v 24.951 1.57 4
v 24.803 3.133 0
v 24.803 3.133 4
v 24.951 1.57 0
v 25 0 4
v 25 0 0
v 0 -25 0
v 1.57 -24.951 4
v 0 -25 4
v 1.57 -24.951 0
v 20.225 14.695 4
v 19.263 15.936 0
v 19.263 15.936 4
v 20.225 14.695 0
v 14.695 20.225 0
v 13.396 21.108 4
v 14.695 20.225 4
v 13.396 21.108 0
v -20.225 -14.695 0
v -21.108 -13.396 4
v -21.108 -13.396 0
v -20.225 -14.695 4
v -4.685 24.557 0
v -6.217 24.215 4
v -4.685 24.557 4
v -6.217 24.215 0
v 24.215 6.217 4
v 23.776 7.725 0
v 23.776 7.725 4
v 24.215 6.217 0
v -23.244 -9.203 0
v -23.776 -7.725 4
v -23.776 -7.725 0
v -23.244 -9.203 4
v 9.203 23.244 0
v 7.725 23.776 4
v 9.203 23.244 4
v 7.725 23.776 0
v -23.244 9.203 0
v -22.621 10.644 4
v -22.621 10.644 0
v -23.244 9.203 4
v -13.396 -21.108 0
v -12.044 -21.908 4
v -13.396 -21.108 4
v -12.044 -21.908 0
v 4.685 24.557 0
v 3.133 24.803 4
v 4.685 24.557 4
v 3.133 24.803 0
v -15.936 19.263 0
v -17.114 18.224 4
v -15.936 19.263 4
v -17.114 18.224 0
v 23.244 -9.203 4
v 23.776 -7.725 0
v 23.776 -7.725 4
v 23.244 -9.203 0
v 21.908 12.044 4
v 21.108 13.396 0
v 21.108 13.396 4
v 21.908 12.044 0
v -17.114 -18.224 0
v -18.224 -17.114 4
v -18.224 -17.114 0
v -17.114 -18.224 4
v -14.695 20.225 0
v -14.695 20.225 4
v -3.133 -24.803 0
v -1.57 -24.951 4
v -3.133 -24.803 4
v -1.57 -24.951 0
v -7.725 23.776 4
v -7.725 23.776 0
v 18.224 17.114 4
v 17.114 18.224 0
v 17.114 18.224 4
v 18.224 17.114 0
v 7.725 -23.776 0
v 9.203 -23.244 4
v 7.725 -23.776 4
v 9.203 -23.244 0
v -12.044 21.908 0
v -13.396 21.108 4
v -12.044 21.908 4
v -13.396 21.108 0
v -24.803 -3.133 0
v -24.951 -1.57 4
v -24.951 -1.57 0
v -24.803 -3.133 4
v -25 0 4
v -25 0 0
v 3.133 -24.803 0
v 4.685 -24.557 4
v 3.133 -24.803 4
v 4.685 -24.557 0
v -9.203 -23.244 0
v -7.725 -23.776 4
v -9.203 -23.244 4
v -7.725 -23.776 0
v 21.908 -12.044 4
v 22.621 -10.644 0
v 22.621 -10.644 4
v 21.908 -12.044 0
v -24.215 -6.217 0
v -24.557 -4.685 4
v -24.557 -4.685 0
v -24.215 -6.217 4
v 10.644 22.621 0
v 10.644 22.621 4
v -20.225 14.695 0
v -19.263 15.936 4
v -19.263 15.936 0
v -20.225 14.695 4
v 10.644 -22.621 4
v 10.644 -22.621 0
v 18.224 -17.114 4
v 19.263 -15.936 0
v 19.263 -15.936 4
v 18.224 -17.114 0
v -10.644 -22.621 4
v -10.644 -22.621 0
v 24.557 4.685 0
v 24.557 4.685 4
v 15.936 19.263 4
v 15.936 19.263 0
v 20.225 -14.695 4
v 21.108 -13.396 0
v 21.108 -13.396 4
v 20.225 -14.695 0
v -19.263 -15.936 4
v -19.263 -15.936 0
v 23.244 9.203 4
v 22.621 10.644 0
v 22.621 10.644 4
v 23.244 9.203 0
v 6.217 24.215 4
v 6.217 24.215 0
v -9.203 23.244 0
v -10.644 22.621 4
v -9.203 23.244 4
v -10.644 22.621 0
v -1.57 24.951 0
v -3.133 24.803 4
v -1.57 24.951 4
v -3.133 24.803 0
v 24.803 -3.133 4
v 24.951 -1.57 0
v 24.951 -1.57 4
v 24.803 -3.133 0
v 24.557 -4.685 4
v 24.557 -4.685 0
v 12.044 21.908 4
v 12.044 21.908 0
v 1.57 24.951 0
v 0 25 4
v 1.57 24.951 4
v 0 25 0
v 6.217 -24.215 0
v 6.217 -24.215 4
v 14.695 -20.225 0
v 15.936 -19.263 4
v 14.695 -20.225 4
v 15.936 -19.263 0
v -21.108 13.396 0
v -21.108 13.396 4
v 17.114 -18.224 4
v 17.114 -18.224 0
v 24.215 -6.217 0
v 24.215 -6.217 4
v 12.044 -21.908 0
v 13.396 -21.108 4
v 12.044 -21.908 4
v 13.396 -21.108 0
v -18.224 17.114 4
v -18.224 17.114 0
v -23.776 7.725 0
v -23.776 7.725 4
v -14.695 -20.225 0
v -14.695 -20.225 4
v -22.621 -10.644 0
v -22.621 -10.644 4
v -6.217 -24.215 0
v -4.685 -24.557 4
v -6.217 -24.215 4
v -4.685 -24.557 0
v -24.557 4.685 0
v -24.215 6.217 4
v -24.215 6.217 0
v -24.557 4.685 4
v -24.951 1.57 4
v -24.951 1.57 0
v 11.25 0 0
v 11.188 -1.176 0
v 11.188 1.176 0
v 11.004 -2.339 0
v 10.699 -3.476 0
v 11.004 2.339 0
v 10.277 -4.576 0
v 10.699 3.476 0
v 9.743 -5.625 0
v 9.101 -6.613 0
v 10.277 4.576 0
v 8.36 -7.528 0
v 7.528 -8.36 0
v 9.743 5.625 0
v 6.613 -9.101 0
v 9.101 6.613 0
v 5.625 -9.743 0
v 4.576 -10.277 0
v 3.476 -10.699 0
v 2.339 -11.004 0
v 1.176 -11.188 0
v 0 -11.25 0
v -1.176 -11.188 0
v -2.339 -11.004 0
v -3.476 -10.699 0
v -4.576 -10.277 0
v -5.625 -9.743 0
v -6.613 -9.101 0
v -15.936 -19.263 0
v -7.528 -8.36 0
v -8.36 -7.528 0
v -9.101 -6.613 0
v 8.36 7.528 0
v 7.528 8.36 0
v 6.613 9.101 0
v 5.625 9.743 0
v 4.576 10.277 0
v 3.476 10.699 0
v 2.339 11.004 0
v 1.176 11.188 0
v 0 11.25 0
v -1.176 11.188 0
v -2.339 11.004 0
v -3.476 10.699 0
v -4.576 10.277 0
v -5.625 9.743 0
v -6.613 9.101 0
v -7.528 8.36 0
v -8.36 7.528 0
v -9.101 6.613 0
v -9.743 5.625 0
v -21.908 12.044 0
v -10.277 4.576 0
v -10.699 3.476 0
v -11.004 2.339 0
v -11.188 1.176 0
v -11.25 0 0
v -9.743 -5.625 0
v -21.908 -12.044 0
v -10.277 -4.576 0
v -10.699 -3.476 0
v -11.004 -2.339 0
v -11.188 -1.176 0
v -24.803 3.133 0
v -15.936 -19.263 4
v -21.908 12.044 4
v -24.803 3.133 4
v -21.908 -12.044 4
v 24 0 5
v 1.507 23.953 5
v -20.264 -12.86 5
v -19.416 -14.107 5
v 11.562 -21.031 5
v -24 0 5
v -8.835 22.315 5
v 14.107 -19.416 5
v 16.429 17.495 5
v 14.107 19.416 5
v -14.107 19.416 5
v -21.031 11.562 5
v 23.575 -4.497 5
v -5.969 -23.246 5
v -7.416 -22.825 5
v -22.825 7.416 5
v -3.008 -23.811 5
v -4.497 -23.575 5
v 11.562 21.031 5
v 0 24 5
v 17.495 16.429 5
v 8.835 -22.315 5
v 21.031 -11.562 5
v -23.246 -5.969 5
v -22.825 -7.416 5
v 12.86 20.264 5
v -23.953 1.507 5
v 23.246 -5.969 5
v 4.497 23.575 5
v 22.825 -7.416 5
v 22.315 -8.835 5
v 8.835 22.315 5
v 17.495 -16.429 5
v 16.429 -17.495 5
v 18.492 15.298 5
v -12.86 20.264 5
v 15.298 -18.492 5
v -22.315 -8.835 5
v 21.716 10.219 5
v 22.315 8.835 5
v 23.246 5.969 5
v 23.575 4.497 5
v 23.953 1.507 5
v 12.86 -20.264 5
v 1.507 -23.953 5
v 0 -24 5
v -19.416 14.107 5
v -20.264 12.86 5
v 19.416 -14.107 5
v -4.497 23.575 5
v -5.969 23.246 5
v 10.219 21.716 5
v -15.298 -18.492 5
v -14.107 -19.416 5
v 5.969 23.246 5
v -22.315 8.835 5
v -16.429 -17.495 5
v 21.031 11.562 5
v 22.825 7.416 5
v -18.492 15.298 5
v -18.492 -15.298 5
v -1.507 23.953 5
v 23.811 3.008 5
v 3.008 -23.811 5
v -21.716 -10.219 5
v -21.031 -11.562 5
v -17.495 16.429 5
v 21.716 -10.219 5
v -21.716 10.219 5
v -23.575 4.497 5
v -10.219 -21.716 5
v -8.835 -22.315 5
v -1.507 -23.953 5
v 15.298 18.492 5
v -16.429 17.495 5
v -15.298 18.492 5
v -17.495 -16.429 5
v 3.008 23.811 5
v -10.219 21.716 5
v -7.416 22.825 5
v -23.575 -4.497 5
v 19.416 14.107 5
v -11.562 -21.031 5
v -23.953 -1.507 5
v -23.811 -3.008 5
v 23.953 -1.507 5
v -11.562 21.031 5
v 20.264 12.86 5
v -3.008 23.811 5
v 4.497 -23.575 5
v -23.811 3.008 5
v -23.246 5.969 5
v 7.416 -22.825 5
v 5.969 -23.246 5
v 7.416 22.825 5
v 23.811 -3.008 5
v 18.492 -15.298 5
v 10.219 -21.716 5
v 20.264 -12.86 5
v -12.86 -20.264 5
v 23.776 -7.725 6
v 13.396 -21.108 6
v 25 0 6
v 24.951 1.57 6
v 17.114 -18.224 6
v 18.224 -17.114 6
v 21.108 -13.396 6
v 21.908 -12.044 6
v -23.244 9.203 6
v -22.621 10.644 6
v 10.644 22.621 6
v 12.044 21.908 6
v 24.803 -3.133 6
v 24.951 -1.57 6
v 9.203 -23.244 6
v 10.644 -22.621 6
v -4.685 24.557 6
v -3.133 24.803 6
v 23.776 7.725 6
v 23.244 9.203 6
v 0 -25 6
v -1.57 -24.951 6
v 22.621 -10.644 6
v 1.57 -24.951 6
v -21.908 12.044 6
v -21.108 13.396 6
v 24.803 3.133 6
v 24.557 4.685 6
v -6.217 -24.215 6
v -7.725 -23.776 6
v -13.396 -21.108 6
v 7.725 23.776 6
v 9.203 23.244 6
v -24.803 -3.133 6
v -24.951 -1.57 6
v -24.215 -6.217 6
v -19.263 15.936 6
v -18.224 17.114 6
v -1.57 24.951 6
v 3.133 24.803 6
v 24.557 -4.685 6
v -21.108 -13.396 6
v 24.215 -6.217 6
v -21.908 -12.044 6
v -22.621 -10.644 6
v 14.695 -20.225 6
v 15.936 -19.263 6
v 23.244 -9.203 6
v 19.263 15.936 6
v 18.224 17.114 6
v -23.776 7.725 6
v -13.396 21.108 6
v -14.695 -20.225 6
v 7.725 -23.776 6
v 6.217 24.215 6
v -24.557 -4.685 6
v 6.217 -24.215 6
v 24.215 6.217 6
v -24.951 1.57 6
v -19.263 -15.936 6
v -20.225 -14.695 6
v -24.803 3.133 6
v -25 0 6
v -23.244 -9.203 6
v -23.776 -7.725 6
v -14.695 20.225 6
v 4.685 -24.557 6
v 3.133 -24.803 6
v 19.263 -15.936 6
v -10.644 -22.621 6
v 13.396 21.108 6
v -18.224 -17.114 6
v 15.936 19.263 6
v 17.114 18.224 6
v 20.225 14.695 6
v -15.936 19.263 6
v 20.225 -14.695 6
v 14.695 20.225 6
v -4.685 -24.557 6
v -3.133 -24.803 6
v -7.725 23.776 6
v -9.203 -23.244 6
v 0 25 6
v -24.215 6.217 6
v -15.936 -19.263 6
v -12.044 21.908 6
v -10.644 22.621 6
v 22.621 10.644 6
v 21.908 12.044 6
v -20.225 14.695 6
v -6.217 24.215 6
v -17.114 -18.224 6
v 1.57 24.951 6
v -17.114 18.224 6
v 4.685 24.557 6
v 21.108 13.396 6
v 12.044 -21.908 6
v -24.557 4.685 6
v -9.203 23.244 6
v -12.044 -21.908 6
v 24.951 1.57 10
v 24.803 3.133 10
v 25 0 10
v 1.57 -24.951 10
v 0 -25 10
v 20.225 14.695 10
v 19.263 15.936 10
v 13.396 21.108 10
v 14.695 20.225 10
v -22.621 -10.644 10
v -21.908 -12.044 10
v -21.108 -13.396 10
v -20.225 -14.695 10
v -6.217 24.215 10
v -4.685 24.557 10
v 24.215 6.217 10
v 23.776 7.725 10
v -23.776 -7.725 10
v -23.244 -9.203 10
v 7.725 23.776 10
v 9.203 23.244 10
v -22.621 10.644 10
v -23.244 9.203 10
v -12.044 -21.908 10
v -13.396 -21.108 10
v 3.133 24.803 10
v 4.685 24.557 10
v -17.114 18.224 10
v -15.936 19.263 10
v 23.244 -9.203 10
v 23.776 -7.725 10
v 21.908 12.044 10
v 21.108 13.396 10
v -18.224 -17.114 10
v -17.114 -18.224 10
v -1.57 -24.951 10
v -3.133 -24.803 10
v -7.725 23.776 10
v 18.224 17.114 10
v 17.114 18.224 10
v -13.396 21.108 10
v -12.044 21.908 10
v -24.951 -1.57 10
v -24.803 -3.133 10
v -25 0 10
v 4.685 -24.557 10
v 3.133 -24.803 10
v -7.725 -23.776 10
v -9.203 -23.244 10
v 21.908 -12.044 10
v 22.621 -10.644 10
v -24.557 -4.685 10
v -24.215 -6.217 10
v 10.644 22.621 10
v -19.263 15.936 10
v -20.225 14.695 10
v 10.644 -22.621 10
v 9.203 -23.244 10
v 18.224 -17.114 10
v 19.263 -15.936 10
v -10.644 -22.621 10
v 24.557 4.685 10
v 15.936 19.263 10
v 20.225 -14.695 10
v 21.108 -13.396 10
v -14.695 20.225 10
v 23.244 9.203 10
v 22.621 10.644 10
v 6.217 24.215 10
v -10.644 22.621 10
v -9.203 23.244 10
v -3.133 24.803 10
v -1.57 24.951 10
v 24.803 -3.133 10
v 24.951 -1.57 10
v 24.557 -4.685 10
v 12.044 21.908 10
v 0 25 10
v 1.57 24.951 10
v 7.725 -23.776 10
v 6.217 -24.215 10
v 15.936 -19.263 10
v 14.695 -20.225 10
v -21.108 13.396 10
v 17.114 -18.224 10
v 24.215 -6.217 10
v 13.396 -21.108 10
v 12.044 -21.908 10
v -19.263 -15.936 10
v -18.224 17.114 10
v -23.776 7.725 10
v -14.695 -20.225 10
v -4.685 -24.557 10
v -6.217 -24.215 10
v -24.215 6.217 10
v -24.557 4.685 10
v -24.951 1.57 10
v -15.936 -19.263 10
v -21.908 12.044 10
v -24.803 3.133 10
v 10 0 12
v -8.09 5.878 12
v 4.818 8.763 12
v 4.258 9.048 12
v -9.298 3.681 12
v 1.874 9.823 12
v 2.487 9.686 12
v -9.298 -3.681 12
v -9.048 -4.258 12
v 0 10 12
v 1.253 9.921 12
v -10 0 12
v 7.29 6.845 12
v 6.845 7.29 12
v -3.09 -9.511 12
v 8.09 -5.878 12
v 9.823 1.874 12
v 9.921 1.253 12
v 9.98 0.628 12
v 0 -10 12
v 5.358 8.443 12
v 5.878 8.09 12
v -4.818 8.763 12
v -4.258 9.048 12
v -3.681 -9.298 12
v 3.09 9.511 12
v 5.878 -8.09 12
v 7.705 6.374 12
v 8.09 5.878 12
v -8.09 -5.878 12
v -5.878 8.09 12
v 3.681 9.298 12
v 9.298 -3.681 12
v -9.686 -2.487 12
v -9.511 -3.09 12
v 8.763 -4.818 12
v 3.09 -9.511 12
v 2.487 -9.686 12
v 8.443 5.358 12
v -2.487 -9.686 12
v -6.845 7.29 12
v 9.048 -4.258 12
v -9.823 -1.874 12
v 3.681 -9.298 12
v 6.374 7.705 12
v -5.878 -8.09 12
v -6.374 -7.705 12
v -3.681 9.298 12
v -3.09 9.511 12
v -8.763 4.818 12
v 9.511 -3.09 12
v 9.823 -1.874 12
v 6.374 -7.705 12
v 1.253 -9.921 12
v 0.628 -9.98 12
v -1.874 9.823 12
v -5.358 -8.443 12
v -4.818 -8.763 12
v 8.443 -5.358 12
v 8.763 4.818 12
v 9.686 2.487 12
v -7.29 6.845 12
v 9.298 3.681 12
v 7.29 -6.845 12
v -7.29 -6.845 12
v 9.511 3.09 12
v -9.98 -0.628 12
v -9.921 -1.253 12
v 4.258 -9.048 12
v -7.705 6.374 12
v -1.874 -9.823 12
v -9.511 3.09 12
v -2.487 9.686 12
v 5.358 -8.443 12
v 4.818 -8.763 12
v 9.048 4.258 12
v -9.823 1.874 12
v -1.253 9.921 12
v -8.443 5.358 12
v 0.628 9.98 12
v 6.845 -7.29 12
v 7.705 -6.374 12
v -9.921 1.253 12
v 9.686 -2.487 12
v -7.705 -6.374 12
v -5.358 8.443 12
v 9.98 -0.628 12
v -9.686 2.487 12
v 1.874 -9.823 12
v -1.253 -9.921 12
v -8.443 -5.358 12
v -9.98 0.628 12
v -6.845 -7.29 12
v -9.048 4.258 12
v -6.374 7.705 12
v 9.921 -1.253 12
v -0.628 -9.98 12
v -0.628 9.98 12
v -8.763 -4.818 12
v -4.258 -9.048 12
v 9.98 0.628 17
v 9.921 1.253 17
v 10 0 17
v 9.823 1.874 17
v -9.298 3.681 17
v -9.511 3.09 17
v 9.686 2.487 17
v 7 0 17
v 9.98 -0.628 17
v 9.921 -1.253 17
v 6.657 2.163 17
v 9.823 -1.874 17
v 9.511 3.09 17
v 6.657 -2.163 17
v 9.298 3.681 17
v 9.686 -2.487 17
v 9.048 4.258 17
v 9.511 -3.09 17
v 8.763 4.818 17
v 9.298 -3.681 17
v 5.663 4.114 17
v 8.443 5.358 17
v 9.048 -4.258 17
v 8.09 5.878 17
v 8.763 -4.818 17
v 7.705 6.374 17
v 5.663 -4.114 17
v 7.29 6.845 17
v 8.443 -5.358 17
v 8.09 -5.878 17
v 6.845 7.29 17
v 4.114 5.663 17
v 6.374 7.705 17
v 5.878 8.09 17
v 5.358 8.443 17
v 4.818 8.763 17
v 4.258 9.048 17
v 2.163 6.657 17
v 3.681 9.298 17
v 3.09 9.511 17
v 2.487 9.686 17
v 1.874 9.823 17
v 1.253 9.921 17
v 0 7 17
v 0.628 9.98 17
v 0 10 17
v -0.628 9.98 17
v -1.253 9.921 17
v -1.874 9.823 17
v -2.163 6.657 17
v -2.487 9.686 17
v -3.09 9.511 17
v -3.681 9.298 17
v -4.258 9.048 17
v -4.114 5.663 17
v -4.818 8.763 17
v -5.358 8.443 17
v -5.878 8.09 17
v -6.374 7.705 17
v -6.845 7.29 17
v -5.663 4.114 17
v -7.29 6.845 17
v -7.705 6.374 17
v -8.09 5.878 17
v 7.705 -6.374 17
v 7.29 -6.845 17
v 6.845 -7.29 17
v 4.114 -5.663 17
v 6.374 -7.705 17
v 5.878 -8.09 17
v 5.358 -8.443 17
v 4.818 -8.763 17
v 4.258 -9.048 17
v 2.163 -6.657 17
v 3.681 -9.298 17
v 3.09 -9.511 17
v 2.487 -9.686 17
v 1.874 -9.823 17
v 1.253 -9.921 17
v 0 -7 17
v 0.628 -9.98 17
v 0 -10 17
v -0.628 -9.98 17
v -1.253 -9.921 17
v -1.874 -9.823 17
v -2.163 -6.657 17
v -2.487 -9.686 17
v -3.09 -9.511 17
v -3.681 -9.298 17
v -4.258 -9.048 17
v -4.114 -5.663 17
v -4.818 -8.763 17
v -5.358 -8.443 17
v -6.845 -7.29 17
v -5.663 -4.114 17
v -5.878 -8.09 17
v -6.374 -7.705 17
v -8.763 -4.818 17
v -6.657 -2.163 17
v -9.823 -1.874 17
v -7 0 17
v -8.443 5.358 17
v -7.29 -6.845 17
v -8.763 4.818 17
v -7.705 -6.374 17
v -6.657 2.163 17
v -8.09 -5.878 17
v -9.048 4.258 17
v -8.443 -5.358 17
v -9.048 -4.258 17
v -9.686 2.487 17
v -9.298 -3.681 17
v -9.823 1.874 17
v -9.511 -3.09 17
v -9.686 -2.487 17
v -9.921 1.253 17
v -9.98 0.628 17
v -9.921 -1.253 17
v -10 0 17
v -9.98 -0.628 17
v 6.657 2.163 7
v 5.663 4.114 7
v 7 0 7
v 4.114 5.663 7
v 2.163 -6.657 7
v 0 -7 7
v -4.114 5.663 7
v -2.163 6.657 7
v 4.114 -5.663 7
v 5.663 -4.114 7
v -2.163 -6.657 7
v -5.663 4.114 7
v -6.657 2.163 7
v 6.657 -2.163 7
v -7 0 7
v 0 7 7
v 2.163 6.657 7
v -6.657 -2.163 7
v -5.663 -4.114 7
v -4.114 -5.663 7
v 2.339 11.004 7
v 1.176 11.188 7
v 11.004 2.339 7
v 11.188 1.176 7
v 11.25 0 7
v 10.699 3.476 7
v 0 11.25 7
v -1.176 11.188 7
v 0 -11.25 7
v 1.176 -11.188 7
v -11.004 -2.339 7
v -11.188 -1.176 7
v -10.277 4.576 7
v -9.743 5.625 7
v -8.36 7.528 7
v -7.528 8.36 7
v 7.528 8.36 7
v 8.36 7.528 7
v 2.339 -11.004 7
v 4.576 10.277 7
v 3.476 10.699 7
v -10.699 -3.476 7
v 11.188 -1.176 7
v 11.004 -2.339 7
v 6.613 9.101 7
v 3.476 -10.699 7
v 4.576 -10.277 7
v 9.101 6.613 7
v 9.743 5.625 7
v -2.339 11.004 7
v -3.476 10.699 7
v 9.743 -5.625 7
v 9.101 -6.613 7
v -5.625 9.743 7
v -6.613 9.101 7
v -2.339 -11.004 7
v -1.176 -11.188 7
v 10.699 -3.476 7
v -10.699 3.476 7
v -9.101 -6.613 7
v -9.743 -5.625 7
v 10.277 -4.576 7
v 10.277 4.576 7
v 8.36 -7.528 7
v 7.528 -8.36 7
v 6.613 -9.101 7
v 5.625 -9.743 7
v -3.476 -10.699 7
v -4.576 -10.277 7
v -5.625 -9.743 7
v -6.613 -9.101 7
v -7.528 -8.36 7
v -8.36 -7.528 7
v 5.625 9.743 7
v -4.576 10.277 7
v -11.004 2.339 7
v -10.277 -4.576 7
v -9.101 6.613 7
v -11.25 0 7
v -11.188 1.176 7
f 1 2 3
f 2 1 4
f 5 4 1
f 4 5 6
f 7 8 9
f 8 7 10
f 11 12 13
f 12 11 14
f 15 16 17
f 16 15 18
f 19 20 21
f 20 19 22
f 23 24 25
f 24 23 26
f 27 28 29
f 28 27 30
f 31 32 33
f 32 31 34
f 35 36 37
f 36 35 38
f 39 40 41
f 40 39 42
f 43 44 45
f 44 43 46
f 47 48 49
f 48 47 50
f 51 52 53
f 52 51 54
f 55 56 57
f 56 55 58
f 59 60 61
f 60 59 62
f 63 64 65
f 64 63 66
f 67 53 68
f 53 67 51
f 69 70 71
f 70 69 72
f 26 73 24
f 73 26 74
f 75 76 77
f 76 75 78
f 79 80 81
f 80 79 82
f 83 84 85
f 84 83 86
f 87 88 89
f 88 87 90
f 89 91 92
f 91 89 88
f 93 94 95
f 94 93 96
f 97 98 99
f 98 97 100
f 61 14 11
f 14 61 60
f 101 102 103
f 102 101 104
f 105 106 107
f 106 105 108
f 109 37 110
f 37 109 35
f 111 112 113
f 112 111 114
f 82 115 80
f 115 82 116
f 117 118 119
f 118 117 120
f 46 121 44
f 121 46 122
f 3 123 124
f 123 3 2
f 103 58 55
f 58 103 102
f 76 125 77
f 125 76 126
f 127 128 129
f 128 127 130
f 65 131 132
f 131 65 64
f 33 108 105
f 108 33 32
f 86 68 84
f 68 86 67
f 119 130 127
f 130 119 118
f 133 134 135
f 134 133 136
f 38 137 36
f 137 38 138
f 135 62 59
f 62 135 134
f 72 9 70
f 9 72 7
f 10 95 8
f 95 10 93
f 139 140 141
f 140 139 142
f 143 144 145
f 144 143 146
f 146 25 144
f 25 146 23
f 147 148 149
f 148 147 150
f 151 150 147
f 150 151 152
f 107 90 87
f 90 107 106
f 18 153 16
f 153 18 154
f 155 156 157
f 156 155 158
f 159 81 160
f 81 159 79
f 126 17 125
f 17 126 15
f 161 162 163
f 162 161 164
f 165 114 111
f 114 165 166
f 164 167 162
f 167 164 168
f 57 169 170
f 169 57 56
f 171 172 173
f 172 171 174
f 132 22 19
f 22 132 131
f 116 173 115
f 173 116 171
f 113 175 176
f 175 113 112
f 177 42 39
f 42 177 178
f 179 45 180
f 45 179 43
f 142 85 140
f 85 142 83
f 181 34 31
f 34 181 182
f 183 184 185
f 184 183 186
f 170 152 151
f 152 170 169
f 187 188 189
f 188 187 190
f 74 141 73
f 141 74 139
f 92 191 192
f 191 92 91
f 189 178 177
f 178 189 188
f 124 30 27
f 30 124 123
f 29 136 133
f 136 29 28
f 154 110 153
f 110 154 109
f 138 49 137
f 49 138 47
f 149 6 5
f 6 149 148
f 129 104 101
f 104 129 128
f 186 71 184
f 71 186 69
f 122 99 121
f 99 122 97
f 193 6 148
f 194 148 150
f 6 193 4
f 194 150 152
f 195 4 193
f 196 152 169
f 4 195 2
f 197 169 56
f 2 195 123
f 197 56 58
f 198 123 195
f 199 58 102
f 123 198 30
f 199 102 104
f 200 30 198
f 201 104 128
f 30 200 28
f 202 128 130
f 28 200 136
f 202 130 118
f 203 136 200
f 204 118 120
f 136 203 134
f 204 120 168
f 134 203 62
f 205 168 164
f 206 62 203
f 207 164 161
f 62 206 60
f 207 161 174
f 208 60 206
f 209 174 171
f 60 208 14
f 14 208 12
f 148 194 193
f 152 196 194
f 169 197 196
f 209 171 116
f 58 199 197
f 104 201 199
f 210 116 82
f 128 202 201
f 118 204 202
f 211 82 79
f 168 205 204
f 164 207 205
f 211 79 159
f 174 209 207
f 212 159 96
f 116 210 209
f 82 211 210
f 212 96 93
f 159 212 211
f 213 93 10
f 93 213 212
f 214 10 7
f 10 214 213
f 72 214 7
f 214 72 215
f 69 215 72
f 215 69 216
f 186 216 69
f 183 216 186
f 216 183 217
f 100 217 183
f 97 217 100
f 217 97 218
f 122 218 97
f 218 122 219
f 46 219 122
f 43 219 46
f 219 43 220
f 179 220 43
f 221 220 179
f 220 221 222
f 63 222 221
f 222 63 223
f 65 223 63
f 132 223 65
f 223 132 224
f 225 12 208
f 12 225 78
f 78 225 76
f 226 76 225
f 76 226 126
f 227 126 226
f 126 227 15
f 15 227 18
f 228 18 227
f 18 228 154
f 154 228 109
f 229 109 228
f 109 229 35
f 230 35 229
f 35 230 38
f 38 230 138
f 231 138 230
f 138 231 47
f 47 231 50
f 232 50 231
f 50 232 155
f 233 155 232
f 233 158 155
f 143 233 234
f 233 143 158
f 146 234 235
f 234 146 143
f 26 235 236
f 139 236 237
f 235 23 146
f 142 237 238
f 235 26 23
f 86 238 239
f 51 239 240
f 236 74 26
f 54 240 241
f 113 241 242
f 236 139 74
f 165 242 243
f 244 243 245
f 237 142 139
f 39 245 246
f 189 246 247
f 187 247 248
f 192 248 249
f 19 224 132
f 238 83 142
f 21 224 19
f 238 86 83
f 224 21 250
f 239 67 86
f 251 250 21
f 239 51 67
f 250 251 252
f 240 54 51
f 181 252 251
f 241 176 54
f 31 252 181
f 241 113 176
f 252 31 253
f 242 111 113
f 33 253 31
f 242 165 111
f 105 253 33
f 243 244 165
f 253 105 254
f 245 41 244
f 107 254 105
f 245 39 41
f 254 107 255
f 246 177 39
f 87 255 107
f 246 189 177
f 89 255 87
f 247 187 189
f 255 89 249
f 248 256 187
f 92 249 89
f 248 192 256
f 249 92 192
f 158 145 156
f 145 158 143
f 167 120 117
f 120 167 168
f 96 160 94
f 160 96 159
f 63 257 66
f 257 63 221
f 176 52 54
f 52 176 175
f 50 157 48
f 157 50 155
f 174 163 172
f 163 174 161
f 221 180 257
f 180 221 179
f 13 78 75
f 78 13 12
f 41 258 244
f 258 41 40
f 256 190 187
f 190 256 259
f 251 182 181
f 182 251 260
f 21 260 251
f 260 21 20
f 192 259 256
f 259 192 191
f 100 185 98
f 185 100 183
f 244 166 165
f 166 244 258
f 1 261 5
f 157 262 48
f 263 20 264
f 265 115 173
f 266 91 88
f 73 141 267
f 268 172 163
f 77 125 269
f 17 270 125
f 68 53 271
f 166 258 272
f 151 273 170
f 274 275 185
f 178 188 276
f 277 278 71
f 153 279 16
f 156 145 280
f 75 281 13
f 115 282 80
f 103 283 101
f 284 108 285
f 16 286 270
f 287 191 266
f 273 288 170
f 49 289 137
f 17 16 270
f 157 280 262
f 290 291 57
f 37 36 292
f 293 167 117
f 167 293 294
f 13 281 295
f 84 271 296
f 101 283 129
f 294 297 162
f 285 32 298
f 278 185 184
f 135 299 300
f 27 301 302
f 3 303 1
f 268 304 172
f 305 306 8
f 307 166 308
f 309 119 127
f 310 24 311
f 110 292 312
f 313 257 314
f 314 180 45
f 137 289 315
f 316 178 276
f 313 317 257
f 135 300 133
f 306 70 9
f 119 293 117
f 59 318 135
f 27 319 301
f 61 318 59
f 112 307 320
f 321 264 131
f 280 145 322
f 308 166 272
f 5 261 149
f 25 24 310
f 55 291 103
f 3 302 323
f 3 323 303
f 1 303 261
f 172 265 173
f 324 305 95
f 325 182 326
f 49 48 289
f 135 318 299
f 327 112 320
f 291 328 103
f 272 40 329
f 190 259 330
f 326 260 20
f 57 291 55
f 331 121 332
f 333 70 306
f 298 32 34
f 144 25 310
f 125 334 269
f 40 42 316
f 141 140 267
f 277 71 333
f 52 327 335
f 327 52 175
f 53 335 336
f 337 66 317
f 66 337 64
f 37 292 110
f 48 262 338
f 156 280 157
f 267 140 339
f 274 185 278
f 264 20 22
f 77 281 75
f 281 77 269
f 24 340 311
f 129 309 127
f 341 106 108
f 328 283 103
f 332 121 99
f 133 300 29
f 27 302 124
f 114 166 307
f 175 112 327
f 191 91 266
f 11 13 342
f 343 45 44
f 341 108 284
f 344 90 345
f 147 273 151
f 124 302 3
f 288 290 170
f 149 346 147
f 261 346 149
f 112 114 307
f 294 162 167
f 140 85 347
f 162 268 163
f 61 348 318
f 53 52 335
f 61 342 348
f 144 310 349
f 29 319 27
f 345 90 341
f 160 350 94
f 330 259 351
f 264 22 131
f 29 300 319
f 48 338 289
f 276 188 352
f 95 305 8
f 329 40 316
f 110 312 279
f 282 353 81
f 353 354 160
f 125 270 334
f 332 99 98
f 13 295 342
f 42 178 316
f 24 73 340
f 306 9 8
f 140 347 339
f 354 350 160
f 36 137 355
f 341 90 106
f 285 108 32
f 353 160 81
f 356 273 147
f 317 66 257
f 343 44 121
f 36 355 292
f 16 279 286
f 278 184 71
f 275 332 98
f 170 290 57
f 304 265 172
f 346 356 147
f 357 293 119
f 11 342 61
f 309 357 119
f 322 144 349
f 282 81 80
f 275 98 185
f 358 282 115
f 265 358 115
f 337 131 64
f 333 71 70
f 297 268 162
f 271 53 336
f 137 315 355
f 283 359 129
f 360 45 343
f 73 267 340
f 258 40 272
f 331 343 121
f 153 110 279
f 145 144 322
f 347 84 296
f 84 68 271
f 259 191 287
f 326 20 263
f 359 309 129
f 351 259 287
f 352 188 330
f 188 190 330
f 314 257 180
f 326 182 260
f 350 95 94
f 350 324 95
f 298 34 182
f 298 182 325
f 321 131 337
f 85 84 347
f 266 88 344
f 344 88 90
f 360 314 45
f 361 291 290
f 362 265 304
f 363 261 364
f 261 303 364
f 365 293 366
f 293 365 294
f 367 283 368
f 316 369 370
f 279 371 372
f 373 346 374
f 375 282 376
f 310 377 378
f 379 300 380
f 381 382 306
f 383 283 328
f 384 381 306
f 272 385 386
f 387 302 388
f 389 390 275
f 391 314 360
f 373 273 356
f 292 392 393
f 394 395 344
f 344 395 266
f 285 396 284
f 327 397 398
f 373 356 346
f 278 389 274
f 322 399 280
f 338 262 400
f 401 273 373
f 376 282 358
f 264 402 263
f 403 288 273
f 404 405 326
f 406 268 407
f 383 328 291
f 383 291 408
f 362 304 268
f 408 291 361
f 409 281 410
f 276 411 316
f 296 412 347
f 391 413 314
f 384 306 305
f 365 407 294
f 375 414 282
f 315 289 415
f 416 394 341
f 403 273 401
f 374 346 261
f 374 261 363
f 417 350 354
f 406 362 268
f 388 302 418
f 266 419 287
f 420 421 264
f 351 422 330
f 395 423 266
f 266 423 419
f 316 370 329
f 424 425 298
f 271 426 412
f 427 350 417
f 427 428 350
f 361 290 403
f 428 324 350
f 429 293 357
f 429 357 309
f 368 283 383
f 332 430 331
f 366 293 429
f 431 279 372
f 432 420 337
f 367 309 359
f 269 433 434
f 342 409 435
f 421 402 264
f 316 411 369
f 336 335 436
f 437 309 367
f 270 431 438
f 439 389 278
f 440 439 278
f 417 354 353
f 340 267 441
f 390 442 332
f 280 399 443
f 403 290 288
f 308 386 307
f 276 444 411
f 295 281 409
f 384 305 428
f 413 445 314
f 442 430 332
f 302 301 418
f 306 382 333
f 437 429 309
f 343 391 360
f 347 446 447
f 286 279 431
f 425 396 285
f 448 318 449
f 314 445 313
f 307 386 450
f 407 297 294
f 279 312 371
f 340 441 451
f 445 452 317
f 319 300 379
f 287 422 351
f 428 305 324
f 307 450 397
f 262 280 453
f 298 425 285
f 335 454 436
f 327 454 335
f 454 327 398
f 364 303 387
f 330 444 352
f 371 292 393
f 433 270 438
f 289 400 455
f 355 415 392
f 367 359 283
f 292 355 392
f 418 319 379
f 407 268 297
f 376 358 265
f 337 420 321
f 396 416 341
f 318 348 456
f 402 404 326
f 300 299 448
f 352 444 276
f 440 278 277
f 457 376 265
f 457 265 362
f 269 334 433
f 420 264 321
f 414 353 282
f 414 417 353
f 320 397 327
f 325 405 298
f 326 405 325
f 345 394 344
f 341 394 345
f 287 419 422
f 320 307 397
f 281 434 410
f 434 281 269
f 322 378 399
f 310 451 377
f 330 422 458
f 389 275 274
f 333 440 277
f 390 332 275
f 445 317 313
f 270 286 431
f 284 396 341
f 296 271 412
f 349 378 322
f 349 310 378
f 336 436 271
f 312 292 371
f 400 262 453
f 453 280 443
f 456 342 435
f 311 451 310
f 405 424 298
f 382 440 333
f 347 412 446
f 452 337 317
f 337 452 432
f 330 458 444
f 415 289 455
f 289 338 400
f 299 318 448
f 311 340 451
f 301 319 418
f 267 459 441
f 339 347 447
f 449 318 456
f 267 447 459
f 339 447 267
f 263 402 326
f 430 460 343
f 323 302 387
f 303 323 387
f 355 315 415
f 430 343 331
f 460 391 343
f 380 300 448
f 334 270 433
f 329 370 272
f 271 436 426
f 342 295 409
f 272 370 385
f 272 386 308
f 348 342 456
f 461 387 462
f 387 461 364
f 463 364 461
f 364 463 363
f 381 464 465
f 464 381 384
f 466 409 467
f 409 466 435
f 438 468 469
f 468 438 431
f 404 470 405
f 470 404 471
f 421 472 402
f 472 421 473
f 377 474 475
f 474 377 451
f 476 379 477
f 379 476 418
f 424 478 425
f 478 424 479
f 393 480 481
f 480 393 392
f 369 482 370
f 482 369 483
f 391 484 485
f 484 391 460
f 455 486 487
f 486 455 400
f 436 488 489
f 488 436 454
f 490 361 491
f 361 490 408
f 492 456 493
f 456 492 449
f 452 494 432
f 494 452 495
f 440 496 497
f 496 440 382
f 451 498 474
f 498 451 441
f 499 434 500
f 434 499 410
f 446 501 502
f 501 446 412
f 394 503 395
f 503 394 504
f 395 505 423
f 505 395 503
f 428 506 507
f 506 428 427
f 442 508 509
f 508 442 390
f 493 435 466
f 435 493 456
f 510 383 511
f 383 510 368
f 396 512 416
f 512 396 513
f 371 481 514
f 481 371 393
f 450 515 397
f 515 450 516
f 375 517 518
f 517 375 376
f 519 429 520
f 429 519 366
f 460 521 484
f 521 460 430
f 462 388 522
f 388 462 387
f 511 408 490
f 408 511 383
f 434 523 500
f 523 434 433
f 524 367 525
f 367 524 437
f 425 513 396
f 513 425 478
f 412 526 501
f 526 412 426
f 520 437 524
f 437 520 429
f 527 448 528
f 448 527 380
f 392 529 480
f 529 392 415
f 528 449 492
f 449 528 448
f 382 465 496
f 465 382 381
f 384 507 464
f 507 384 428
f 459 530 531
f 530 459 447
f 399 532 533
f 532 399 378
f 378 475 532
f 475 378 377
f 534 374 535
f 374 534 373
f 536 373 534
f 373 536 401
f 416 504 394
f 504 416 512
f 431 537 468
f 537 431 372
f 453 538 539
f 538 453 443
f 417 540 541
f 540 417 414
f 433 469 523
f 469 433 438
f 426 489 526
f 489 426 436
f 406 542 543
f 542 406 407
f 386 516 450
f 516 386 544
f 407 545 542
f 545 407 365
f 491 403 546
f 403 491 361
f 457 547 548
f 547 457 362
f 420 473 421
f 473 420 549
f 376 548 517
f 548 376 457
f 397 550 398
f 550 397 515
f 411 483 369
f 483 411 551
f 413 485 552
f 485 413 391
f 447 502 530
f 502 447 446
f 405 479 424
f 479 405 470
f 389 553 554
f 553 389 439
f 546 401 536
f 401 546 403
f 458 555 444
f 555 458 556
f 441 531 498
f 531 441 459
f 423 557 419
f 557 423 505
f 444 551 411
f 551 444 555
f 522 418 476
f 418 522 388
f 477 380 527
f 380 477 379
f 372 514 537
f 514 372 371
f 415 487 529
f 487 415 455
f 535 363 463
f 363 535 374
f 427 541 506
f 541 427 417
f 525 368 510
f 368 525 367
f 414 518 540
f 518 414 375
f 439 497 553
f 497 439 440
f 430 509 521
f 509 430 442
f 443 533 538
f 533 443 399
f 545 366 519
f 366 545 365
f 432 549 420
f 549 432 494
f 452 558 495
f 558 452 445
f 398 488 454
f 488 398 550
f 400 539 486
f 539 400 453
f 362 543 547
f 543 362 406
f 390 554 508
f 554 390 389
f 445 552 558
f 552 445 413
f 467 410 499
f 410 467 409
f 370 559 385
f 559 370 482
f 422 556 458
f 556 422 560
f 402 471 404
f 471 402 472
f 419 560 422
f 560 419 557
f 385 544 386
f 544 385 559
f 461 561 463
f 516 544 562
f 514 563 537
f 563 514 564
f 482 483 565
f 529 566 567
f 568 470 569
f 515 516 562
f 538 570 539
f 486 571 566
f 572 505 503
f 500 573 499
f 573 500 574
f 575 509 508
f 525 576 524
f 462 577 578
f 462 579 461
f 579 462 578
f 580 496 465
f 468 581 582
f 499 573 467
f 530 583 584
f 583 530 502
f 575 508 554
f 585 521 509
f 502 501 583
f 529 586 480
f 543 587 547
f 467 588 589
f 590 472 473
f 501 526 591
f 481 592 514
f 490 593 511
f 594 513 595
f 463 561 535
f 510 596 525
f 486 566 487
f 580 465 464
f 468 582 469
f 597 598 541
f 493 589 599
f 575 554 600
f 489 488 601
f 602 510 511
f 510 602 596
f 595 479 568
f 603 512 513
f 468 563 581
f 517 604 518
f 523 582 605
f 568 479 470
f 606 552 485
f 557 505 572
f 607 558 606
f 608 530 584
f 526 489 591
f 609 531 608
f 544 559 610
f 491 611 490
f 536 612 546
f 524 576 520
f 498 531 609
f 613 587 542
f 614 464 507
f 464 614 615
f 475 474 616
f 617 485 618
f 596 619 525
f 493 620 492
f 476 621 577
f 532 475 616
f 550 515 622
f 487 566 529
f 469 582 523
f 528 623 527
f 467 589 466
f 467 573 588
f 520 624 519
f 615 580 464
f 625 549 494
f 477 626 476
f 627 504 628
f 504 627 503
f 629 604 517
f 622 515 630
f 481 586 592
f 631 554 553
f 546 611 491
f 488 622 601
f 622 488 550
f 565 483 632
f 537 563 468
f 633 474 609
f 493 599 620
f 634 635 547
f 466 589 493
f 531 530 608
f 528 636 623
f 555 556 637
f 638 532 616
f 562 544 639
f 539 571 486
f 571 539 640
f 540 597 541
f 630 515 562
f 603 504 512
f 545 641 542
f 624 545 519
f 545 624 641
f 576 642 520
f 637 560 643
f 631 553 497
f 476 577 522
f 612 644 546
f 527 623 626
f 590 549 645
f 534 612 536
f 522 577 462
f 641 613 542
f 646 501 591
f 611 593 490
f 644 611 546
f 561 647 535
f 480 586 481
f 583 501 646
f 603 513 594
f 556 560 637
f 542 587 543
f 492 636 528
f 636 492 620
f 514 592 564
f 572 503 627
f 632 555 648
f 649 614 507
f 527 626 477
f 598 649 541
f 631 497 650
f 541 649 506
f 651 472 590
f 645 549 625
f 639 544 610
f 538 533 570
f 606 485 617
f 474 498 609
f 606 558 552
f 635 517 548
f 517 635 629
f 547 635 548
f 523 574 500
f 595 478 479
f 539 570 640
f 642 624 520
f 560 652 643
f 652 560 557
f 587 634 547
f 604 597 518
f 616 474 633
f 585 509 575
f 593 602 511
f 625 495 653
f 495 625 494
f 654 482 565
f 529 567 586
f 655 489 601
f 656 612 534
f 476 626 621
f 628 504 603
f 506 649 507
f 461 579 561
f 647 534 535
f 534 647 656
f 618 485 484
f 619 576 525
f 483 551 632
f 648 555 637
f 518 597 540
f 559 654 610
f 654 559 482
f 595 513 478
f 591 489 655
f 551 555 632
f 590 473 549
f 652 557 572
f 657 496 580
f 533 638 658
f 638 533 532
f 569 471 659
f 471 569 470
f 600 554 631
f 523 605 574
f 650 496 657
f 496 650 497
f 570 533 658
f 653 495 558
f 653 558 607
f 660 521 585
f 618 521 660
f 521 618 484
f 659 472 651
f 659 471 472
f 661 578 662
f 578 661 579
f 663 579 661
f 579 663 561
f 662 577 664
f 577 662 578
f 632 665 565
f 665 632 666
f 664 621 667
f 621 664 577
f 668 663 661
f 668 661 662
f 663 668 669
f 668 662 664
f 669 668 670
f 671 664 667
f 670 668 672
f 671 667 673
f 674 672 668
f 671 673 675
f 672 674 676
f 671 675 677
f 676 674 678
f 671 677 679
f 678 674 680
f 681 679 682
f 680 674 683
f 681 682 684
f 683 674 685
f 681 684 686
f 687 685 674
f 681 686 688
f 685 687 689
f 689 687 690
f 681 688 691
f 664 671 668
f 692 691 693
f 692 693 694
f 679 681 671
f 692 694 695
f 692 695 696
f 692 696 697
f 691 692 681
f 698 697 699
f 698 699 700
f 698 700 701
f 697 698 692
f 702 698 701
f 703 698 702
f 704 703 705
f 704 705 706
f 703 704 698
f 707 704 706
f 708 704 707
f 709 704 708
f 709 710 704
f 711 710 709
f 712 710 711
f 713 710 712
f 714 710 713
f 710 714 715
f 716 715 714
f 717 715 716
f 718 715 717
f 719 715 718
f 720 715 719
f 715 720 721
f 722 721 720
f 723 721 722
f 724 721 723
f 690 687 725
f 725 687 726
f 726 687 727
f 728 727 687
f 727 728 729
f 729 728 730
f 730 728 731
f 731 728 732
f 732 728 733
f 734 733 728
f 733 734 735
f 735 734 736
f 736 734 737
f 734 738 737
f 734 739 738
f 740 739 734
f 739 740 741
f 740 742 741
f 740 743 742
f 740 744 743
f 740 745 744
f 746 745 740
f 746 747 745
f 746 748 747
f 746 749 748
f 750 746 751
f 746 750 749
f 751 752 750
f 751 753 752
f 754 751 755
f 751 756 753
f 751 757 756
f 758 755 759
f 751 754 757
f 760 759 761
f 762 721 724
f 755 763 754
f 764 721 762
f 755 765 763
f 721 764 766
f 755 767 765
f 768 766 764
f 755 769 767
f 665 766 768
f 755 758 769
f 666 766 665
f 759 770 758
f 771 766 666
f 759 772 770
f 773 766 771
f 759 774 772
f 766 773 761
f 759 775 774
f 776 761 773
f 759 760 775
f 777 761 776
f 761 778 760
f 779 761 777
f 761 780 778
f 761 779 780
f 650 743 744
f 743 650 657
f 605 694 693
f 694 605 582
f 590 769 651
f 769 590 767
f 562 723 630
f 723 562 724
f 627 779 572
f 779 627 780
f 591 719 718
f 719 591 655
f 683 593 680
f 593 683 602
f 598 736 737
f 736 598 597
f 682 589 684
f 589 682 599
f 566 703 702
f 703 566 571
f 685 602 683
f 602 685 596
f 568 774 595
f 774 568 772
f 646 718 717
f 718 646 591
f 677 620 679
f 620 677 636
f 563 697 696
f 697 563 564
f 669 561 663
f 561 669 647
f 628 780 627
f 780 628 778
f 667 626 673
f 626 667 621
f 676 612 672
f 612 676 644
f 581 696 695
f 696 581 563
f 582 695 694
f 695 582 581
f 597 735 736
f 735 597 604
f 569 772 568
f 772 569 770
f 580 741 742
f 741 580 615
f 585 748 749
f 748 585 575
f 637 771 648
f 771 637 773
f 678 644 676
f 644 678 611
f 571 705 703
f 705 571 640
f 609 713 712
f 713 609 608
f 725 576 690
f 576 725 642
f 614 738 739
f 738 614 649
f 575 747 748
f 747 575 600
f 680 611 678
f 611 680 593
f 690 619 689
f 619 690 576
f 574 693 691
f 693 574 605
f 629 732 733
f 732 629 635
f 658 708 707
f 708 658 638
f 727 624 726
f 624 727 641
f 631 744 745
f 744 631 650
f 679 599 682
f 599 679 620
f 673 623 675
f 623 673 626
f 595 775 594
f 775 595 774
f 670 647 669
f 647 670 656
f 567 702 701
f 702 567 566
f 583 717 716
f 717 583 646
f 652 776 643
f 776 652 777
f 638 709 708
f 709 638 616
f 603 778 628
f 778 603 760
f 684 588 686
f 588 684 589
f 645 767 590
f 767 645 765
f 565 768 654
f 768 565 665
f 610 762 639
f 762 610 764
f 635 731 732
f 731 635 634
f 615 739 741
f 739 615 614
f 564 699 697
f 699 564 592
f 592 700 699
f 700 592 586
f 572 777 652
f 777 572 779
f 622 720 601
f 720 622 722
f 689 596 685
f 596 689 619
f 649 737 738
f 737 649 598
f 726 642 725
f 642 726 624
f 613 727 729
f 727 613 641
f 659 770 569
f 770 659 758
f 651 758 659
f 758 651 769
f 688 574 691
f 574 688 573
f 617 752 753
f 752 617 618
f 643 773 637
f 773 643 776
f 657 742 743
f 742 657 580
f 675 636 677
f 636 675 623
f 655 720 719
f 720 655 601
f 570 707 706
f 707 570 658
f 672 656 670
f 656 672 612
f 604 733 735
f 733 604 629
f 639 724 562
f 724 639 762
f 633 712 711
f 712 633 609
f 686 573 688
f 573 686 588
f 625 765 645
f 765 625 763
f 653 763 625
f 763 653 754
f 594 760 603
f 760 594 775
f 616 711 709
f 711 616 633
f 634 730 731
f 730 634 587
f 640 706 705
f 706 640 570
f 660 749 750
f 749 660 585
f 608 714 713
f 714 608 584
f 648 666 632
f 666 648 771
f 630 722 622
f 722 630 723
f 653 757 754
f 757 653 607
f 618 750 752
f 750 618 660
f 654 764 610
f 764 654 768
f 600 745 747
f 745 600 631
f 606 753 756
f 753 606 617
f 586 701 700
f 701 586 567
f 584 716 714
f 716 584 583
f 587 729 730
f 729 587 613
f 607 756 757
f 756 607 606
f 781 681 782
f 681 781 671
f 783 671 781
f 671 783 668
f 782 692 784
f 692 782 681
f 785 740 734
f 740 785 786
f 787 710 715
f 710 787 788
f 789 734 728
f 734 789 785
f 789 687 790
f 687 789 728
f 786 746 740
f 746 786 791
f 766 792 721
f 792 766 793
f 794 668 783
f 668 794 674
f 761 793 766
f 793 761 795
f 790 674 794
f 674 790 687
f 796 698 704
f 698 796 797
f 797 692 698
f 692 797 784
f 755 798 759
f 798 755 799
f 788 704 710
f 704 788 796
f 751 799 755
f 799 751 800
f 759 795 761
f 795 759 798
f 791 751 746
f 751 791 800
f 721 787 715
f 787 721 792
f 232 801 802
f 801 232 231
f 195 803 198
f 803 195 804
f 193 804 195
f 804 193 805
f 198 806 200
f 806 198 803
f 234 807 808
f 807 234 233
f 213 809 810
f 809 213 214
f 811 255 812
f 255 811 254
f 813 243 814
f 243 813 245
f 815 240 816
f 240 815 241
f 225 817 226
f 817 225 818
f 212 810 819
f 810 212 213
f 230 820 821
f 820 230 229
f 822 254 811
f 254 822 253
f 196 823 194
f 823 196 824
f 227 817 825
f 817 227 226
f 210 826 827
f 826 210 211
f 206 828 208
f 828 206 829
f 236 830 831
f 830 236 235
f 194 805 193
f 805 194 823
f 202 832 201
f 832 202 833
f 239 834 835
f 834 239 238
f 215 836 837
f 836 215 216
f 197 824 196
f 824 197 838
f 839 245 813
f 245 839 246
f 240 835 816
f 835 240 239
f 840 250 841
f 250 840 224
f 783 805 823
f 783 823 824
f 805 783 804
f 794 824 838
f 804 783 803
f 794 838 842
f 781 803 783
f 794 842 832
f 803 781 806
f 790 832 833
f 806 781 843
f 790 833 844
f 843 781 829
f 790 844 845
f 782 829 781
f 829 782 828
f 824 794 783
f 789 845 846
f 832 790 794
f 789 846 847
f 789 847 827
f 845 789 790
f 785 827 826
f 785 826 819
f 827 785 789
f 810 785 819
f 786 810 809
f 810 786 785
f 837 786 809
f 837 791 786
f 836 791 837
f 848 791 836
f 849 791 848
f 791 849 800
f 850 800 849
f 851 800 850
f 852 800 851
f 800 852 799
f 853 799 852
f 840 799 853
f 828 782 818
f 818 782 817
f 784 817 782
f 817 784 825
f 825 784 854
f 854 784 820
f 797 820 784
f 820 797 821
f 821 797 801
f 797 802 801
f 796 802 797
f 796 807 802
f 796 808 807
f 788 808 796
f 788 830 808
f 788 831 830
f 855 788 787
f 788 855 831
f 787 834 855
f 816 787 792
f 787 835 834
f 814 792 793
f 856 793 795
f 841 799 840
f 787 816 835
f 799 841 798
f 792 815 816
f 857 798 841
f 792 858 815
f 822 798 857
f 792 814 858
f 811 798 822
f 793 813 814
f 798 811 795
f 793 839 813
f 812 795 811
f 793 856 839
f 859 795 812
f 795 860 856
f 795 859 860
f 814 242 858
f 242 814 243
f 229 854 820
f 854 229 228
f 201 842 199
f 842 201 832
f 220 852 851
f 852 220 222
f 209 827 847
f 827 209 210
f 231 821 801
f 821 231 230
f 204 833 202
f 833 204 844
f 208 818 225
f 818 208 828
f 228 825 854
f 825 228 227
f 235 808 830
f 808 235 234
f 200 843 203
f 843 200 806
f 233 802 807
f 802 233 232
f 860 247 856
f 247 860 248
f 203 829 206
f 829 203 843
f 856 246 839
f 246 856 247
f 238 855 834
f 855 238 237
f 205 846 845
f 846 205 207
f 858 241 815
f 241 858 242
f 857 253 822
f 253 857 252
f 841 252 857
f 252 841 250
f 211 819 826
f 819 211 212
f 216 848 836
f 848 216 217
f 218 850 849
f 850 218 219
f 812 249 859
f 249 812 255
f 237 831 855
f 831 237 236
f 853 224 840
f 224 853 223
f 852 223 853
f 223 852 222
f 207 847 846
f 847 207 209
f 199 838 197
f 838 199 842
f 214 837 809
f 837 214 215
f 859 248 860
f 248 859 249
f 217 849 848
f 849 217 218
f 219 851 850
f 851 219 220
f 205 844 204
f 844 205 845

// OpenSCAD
//RUEDA con radios 
//parametros rueda

//medidas del aro externo de la rueda.
diametro=50; //diametro externo de la rueda. influye en la velocidad.
grosor=4+6;	// grosor del aro externo de la rueda
altura_hub=7;
altura_bisel=2;

//medidas de los radios
//grosor_radios=8; //grosor o altura de los radios

//medidas del hub central
//diam_eje=4;  //eje central por el que pasa el tornillo de izquierdas


hub=true;
//medidas de los agujeros del hub
metrica_hub=3;

module rueda(gros=grosor, diam=diametro)
{	


	difference(){
		
				
				union(){
					cylinder (r=diam/2 ,h=gros/2-1, $fn=100);

					translate([0,0,grosor/2-1])
					cylinder (r1=diam/2, r2=(diam-2)/2,h=1, $fn=100);

					translate([0,0,grosor/2])
					cylinder (r2=diam/2, r1=(diam-2)/2,h=1, $fn=100);
					
					translate([0,0,grosor/2+1])
					cylinder (r=diam/2 ,h=gros/2-1, $fn=100);

					translate([0,0,grosor])
					cylinder (r1=diam/2,r2=20/2, h=altura_bisel, $fn=100);
					if (hub==true){
						translate([0,0,grosor])
						cylinder (r=20/2, h=altura_hub, $fn=100);
					}
					
				}
				
				
				
				if (hub==true){
					cylinder (r=14/2, h=100, $fn=20, center=true);
					translate([0,0,0])
					cylinder (r=22.5/2, h=7, $fn=60);
				}
				else{
					cylinder (r=18/2, h=100, $fn=20, center=true);
					translate([0,0,grosor+altura_bisel-7])
					cylinder (r=22.5/2, h=7, $fn=60);
				}

				

				//translate([8,0,0])
				//cylinder (r=3.5/2, h=100, $fn=20, center=true);
				//translate([-8,0,0])
				//cylinder (r=3.5/2, h=100, $fn=20, center=true);
			
	}//fin diference
}

				//translate([diametro/2-10,0,grosor])
				//cube ([10,10,10]);


	
	rueda();
	
	

	




	
